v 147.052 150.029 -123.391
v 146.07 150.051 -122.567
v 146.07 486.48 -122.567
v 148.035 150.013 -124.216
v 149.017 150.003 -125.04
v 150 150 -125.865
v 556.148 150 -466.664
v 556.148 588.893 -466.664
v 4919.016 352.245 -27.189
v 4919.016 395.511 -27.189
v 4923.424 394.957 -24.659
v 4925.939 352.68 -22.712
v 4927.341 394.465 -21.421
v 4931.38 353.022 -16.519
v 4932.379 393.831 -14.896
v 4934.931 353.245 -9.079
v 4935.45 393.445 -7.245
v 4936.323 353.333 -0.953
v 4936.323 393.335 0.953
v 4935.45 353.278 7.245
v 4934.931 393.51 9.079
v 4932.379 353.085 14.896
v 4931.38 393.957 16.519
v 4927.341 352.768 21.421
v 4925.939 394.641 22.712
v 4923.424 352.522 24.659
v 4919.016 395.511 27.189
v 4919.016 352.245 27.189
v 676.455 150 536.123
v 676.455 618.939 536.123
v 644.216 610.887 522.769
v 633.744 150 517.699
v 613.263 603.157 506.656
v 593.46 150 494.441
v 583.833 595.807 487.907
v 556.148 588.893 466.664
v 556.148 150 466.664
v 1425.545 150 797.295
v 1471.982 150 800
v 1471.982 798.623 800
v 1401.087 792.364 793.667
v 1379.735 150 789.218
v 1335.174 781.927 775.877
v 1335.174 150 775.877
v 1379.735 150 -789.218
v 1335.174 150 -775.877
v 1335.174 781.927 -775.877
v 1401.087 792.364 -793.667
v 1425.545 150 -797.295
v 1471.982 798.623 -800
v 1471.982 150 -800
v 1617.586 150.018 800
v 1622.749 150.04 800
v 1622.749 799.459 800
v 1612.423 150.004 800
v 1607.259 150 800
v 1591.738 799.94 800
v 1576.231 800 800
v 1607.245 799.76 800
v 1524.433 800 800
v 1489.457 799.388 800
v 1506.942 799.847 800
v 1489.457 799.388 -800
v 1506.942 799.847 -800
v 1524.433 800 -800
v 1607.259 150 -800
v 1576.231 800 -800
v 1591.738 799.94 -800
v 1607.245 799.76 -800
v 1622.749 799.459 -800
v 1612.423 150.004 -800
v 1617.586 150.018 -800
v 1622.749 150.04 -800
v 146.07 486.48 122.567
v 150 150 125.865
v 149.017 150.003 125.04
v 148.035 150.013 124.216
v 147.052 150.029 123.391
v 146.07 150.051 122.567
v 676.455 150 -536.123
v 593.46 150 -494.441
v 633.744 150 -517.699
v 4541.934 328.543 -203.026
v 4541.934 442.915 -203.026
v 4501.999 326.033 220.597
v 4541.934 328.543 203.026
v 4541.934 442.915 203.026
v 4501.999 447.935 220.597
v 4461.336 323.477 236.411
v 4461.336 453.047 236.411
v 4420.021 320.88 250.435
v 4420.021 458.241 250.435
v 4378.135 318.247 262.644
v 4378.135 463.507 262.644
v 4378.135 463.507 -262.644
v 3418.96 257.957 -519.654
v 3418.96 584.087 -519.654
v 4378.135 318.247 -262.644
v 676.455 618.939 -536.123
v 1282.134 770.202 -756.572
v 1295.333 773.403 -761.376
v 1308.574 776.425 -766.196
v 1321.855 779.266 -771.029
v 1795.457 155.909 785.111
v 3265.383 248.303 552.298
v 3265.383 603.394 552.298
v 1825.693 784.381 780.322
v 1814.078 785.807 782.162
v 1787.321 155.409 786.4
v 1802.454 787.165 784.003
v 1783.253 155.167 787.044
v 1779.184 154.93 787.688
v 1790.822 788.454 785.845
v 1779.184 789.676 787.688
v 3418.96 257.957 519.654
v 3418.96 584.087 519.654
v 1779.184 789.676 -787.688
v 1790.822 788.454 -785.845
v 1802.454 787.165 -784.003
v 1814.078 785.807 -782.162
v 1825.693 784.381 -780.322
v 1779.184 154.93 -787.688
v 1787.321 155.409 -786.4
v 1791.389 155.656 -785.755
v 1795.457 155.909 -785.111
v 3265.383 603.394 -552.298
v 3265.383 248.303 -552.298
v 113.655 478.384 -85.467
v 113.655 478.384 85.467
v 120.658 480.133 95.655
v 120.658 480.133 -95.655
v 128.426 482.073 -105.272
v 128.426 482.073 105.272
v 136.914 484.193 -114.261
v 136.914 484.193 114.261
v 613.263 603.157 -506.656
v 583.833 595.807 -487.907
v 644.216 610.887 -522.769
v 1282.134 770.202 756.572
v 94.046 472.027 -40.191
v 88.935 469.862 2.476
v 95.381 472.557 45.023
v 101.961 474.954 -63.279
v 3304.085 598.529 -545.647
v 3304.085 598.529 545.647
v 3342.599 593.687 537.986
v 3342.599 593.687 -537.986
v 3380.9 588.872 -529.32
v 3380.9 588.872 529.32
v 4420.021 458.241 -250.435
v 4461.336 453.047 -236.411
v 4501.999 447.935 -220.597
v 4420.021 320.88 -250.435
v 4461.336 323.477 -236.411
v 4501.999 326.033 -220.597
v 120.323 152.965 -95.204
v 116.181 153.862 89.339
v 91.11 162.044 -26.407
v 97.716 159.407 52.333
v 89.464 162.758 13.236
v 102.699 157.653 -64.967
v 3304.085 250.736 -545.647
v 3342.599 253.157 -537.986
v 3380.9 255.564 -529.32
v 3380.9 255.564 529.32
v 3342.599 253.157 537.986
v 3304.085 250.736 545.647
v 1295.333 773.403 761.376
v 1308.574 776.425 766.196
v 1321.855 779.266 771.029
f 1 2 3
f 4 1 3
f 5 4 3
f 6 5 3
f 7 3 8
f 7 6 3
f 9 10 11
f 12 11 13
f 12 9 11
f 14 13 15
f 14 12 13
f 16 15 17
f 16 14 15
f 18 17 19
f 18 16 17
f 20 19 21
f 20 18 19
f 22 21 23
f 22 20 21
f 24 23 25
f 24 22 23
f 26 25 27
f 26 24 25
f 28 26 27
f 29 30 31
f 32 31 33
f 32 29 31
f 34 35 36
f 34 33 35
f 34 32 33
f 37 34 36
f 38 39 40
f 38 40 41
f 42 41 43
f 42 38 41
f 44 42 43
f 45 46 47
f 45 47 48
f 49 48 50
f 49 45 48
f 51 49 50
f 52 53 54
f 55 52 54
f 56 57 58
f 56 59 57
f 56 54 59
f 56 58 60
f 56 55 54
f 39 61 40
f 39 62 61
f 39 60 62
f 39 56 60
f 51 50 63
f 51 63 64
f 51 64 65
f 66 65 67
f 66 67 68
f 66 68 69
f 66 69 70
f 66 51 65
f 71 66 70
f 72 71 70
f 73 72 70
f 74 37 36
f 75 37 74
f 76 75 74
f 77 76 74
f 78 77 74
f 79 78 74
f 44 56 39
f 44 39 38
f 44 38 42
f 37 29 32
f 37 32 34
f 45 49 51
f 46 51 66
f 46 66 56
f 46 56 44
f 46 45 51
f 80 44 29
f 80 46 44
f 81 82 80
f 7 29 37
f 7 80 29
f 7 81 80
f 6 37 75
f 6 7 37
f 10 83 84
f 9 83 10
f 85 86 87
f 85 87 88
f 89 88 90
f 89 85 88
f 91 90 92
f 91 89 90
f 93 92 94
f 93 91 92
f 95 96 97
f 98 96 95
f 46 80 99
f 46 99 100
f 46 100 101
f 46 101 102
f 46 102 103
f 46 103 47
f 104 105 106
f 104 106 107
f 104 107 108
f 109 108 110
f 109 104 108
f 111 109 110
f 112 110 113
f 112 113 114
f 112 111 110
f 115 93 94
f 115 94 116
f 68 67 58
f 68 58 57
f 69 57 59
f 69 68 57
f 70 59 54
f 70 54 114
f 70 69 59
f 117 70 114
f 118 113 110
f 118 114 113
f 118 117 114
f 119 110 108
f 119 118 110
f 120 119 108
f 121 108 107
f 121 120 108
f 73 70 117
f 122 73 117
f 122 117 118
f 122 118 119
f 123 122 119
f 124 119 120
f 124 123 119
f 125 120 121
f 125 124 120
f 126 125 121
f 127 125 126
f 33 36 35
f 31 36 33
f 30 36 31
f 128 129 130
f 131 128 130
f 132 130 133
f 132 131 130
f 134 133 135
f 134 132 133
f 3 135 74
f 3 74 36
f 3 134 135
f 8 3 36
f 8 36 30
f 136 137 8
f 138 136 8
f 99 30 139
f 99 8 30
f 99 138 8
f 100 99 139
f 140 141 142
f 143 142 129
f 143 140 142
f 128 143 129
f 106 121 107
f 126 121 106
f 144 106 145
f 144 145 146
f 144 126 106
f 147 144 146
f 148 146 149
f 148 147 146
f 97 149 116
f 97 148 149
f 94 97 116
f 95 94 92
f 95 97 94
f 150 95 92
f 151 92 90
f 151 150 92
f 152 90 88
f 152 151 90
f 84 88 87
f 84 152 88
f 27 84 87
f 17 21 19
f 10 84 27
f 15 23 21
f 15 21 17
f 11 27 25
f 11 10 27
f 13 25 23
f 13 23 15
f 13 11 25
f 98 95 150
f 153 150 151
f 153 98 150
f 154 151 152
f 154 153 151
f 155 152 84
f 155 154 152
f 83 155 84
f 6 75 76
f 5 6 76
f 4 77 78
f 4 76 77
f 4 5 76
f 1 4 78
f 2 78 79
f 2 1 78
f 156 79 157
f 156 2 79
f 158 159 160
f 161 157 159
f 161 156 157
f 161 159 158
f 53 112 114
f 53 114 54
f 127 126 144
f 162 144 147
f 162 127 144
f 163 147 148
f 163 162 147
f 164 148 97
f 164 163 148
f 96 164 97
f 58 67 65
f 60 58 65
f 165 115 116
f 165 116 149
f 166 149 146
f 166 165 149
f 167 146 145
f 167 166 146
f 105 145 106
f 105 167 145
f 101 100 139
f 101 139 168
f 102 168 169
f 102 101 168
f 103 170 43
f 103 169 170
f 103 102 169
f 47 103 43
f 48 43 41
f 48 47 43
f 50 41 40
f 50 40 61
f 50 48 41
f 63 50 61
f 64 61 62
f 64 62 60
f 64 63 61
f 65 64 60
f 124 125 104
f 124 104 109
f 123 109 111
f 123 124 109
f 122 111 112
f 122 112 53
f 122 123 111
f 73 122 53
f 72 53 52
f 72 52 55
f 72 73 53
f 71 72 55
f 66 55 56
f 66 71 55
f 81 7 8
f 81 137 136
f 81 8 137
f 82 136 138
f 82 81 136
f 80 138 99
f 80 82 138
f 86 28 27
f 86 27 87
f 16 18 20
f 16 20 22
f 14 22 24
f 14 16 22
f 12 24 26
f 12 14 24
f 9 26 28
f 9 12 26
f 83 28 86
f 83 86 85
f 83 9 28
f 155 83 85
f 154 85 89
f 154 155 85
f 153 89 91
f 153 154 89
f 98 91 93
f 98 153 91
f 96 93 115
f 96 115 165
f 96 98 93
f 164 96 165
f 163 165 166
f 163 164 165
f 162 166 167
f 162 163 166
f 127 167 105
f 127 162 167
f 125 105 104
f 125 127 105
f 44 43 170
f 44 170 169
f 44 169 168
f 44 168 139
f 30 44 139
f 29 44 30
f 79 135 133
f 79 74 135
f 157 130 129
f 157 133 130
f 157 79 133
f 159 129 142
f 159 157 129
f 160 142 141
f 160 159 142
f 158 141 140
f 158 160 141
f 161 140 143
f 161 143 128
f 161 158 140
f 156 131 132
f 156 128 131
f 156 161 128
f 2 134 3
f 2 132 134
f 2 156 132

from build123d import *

# Parameters (mm, degrees)
TOPVIEW_EXTRUDE_DEPTH      = 800
SIDEPROFILE_CUT_DEPTH      = 5065.329373382
SIDEPROFILE_CUT_DEPTH_BACK = 5065.329373382
SKETCH2_OUTSIDE_W          = 5882.814
SKETCH2_OUTSIDE_H          = 1835.392


with BuildPart() as part:
    # Sketch1 → TopView_Extrude (new body)
    with BuildSketch(Plane(origin=(0, 0, 0), x_dir=(1, 0, 0), z_dir=(0, 1, 0))):
        with BuildLine():
            Line((146.069849076, 122.567124227), (556.148324977, 466.663731547))
            ThreePointArc((556.148324977, 466.663731547), (613.263316637, 506.656075273), (676.455195963, 536.122941687))
            Line((676.455195963, 536.122941687), (1335.173700718, 775.877020708))
            ThreePointArc((1335.173700718, 775.877020708), (1402.522523085, 793.923094197), (1471.981833896, 800))
            Line((1471.981833896, 800), (1622.74932188, 800))
            ThreePointArc((1622.74932188, 800), (1701.208389168, 796.917335971), (1779.183730567, 787.688349521))
            Line((1779.183730567, 787.688349521), (3265.383087903, 552.297583021))
            ThreePointArc((3265.383087903, 552.297583021), (3342.599008928, 537.986460302), (3418.960120906, 519.653777172))
            Line((3418.960120906, 519.653777172), (4378.134590748, 262.643696963))
            ThreePointArc((4378.134590748, 262.643696963), (4461.335543574, 236.410539363), (4541.933526436, 203.025778355))
            Line((4541.933526436, 203.025778355), (4919.016455083, 27.18923681))
            ThreePointArc((4919.016455083, 27.18923681), (4936.337914092, 0), (4919.016455083, -27.18923681))
            Line((4919.016455083, -27.18923681), (4541.933526436, -203.025778355))
            ThreePointArc((4541.933526436, -203.025778355), (4461.335543574, -236.410539363), (4378.134590748, -262.643696963))
            Line((4378.134590748, -262.643696963), (3418.960120906, -519.653777172))
            ThreePointArc((3418.960120906, -519.653777172), (3342.599008928, -537.986460302), (3265.383087903, -552.297583021))
            Line((3265.383087903, -552.297583021), (1779.183730567, -787.688349521))
            ThreePointArc((1779.183730567, -787.688349521), (1701.208389168, -796.917335971), (1622.74932188, -800))
            Line((1622.74932188, -800), (1471.981833896, -800))
            ThreePointArc((1471.981833896, -800), (1402.522523085, -793.923094197), (1335.173700718, -775.877020708))
            Line((1335.173700718, -775.877020708), (676.455195963, -536.122941687))
            ThreePointArc((676.455195963, -536.122941687), (613.263316637, -506.656075273), (556.148324977, -466.663731547))
            Line((556.148324977, -466.663731547), (146.069849076, -122.567124227))
            ThreePointArc((146.069849076, -122.567124227), (88.915850742, 0), (146.069849076, 122.567124227))
        make_face()
    extrude(amount=TOPVIEW_EXTRUDE_DEPTH)

    # Sketch2 outside → SideProfile_Cut (cut, two sides: drawn at the far end of the back side and taken through both)
    with BuildSketch(Plane.XY.offset(-SIDEPROFILE_CUT_DEPTH_BACK)):
        with Locations((2512.627, 400)):
            Rectangle(SKETCH2_OUTSIDE_W, SKETCH2_OUTSIDE_H)
        with BuildLine():
            Line((0, 300), (0, 332.854125267))
            ThreePointArc((0, 332.854125267), (31.780430043, 425.180358155), (113.65511039, 478.384359237))
            Line((113.65511039, 478.384359237), (1282.133703367, 770.201559797))
            ThreePointArc((1282.133703367, 770.201559797), (1402.370605908, 792.522432945), (1524.432967436, 800))
            Line((1524.432967436, 800), (1576.231046196, 800))
            ThreePointArc((1576.231046196, 800), (1701.206287536, 796.091478127), (1825.693060411, 784.381189052))
            Line((1825.693060411, 784.381189052), (4977.324, 388.181))
            Line((4977.324, 388.181), (4977.324, 355.91))
            Line((4977.324, 355.91), (1795.457321969, 155.908910924))
            ThreePointArc((1795.457321969, 155.908910924), (1701.40460764, 151.477591611), (1607.259154289, 150))
            Line((1607.259154289, 150), (150, 150))
            ThreePointArc((150, 150), (43.933982822, 193.933982822), (0, 300))
        make_face(mode=Mode.SUBTRACT)
    extrude(amount=SIDEPROFILE_CUT_DEPTH + SIDEPROFILE_CUT_DEPTH_BACK, mode=Mode.SUBTRACT)


solid = part.part
